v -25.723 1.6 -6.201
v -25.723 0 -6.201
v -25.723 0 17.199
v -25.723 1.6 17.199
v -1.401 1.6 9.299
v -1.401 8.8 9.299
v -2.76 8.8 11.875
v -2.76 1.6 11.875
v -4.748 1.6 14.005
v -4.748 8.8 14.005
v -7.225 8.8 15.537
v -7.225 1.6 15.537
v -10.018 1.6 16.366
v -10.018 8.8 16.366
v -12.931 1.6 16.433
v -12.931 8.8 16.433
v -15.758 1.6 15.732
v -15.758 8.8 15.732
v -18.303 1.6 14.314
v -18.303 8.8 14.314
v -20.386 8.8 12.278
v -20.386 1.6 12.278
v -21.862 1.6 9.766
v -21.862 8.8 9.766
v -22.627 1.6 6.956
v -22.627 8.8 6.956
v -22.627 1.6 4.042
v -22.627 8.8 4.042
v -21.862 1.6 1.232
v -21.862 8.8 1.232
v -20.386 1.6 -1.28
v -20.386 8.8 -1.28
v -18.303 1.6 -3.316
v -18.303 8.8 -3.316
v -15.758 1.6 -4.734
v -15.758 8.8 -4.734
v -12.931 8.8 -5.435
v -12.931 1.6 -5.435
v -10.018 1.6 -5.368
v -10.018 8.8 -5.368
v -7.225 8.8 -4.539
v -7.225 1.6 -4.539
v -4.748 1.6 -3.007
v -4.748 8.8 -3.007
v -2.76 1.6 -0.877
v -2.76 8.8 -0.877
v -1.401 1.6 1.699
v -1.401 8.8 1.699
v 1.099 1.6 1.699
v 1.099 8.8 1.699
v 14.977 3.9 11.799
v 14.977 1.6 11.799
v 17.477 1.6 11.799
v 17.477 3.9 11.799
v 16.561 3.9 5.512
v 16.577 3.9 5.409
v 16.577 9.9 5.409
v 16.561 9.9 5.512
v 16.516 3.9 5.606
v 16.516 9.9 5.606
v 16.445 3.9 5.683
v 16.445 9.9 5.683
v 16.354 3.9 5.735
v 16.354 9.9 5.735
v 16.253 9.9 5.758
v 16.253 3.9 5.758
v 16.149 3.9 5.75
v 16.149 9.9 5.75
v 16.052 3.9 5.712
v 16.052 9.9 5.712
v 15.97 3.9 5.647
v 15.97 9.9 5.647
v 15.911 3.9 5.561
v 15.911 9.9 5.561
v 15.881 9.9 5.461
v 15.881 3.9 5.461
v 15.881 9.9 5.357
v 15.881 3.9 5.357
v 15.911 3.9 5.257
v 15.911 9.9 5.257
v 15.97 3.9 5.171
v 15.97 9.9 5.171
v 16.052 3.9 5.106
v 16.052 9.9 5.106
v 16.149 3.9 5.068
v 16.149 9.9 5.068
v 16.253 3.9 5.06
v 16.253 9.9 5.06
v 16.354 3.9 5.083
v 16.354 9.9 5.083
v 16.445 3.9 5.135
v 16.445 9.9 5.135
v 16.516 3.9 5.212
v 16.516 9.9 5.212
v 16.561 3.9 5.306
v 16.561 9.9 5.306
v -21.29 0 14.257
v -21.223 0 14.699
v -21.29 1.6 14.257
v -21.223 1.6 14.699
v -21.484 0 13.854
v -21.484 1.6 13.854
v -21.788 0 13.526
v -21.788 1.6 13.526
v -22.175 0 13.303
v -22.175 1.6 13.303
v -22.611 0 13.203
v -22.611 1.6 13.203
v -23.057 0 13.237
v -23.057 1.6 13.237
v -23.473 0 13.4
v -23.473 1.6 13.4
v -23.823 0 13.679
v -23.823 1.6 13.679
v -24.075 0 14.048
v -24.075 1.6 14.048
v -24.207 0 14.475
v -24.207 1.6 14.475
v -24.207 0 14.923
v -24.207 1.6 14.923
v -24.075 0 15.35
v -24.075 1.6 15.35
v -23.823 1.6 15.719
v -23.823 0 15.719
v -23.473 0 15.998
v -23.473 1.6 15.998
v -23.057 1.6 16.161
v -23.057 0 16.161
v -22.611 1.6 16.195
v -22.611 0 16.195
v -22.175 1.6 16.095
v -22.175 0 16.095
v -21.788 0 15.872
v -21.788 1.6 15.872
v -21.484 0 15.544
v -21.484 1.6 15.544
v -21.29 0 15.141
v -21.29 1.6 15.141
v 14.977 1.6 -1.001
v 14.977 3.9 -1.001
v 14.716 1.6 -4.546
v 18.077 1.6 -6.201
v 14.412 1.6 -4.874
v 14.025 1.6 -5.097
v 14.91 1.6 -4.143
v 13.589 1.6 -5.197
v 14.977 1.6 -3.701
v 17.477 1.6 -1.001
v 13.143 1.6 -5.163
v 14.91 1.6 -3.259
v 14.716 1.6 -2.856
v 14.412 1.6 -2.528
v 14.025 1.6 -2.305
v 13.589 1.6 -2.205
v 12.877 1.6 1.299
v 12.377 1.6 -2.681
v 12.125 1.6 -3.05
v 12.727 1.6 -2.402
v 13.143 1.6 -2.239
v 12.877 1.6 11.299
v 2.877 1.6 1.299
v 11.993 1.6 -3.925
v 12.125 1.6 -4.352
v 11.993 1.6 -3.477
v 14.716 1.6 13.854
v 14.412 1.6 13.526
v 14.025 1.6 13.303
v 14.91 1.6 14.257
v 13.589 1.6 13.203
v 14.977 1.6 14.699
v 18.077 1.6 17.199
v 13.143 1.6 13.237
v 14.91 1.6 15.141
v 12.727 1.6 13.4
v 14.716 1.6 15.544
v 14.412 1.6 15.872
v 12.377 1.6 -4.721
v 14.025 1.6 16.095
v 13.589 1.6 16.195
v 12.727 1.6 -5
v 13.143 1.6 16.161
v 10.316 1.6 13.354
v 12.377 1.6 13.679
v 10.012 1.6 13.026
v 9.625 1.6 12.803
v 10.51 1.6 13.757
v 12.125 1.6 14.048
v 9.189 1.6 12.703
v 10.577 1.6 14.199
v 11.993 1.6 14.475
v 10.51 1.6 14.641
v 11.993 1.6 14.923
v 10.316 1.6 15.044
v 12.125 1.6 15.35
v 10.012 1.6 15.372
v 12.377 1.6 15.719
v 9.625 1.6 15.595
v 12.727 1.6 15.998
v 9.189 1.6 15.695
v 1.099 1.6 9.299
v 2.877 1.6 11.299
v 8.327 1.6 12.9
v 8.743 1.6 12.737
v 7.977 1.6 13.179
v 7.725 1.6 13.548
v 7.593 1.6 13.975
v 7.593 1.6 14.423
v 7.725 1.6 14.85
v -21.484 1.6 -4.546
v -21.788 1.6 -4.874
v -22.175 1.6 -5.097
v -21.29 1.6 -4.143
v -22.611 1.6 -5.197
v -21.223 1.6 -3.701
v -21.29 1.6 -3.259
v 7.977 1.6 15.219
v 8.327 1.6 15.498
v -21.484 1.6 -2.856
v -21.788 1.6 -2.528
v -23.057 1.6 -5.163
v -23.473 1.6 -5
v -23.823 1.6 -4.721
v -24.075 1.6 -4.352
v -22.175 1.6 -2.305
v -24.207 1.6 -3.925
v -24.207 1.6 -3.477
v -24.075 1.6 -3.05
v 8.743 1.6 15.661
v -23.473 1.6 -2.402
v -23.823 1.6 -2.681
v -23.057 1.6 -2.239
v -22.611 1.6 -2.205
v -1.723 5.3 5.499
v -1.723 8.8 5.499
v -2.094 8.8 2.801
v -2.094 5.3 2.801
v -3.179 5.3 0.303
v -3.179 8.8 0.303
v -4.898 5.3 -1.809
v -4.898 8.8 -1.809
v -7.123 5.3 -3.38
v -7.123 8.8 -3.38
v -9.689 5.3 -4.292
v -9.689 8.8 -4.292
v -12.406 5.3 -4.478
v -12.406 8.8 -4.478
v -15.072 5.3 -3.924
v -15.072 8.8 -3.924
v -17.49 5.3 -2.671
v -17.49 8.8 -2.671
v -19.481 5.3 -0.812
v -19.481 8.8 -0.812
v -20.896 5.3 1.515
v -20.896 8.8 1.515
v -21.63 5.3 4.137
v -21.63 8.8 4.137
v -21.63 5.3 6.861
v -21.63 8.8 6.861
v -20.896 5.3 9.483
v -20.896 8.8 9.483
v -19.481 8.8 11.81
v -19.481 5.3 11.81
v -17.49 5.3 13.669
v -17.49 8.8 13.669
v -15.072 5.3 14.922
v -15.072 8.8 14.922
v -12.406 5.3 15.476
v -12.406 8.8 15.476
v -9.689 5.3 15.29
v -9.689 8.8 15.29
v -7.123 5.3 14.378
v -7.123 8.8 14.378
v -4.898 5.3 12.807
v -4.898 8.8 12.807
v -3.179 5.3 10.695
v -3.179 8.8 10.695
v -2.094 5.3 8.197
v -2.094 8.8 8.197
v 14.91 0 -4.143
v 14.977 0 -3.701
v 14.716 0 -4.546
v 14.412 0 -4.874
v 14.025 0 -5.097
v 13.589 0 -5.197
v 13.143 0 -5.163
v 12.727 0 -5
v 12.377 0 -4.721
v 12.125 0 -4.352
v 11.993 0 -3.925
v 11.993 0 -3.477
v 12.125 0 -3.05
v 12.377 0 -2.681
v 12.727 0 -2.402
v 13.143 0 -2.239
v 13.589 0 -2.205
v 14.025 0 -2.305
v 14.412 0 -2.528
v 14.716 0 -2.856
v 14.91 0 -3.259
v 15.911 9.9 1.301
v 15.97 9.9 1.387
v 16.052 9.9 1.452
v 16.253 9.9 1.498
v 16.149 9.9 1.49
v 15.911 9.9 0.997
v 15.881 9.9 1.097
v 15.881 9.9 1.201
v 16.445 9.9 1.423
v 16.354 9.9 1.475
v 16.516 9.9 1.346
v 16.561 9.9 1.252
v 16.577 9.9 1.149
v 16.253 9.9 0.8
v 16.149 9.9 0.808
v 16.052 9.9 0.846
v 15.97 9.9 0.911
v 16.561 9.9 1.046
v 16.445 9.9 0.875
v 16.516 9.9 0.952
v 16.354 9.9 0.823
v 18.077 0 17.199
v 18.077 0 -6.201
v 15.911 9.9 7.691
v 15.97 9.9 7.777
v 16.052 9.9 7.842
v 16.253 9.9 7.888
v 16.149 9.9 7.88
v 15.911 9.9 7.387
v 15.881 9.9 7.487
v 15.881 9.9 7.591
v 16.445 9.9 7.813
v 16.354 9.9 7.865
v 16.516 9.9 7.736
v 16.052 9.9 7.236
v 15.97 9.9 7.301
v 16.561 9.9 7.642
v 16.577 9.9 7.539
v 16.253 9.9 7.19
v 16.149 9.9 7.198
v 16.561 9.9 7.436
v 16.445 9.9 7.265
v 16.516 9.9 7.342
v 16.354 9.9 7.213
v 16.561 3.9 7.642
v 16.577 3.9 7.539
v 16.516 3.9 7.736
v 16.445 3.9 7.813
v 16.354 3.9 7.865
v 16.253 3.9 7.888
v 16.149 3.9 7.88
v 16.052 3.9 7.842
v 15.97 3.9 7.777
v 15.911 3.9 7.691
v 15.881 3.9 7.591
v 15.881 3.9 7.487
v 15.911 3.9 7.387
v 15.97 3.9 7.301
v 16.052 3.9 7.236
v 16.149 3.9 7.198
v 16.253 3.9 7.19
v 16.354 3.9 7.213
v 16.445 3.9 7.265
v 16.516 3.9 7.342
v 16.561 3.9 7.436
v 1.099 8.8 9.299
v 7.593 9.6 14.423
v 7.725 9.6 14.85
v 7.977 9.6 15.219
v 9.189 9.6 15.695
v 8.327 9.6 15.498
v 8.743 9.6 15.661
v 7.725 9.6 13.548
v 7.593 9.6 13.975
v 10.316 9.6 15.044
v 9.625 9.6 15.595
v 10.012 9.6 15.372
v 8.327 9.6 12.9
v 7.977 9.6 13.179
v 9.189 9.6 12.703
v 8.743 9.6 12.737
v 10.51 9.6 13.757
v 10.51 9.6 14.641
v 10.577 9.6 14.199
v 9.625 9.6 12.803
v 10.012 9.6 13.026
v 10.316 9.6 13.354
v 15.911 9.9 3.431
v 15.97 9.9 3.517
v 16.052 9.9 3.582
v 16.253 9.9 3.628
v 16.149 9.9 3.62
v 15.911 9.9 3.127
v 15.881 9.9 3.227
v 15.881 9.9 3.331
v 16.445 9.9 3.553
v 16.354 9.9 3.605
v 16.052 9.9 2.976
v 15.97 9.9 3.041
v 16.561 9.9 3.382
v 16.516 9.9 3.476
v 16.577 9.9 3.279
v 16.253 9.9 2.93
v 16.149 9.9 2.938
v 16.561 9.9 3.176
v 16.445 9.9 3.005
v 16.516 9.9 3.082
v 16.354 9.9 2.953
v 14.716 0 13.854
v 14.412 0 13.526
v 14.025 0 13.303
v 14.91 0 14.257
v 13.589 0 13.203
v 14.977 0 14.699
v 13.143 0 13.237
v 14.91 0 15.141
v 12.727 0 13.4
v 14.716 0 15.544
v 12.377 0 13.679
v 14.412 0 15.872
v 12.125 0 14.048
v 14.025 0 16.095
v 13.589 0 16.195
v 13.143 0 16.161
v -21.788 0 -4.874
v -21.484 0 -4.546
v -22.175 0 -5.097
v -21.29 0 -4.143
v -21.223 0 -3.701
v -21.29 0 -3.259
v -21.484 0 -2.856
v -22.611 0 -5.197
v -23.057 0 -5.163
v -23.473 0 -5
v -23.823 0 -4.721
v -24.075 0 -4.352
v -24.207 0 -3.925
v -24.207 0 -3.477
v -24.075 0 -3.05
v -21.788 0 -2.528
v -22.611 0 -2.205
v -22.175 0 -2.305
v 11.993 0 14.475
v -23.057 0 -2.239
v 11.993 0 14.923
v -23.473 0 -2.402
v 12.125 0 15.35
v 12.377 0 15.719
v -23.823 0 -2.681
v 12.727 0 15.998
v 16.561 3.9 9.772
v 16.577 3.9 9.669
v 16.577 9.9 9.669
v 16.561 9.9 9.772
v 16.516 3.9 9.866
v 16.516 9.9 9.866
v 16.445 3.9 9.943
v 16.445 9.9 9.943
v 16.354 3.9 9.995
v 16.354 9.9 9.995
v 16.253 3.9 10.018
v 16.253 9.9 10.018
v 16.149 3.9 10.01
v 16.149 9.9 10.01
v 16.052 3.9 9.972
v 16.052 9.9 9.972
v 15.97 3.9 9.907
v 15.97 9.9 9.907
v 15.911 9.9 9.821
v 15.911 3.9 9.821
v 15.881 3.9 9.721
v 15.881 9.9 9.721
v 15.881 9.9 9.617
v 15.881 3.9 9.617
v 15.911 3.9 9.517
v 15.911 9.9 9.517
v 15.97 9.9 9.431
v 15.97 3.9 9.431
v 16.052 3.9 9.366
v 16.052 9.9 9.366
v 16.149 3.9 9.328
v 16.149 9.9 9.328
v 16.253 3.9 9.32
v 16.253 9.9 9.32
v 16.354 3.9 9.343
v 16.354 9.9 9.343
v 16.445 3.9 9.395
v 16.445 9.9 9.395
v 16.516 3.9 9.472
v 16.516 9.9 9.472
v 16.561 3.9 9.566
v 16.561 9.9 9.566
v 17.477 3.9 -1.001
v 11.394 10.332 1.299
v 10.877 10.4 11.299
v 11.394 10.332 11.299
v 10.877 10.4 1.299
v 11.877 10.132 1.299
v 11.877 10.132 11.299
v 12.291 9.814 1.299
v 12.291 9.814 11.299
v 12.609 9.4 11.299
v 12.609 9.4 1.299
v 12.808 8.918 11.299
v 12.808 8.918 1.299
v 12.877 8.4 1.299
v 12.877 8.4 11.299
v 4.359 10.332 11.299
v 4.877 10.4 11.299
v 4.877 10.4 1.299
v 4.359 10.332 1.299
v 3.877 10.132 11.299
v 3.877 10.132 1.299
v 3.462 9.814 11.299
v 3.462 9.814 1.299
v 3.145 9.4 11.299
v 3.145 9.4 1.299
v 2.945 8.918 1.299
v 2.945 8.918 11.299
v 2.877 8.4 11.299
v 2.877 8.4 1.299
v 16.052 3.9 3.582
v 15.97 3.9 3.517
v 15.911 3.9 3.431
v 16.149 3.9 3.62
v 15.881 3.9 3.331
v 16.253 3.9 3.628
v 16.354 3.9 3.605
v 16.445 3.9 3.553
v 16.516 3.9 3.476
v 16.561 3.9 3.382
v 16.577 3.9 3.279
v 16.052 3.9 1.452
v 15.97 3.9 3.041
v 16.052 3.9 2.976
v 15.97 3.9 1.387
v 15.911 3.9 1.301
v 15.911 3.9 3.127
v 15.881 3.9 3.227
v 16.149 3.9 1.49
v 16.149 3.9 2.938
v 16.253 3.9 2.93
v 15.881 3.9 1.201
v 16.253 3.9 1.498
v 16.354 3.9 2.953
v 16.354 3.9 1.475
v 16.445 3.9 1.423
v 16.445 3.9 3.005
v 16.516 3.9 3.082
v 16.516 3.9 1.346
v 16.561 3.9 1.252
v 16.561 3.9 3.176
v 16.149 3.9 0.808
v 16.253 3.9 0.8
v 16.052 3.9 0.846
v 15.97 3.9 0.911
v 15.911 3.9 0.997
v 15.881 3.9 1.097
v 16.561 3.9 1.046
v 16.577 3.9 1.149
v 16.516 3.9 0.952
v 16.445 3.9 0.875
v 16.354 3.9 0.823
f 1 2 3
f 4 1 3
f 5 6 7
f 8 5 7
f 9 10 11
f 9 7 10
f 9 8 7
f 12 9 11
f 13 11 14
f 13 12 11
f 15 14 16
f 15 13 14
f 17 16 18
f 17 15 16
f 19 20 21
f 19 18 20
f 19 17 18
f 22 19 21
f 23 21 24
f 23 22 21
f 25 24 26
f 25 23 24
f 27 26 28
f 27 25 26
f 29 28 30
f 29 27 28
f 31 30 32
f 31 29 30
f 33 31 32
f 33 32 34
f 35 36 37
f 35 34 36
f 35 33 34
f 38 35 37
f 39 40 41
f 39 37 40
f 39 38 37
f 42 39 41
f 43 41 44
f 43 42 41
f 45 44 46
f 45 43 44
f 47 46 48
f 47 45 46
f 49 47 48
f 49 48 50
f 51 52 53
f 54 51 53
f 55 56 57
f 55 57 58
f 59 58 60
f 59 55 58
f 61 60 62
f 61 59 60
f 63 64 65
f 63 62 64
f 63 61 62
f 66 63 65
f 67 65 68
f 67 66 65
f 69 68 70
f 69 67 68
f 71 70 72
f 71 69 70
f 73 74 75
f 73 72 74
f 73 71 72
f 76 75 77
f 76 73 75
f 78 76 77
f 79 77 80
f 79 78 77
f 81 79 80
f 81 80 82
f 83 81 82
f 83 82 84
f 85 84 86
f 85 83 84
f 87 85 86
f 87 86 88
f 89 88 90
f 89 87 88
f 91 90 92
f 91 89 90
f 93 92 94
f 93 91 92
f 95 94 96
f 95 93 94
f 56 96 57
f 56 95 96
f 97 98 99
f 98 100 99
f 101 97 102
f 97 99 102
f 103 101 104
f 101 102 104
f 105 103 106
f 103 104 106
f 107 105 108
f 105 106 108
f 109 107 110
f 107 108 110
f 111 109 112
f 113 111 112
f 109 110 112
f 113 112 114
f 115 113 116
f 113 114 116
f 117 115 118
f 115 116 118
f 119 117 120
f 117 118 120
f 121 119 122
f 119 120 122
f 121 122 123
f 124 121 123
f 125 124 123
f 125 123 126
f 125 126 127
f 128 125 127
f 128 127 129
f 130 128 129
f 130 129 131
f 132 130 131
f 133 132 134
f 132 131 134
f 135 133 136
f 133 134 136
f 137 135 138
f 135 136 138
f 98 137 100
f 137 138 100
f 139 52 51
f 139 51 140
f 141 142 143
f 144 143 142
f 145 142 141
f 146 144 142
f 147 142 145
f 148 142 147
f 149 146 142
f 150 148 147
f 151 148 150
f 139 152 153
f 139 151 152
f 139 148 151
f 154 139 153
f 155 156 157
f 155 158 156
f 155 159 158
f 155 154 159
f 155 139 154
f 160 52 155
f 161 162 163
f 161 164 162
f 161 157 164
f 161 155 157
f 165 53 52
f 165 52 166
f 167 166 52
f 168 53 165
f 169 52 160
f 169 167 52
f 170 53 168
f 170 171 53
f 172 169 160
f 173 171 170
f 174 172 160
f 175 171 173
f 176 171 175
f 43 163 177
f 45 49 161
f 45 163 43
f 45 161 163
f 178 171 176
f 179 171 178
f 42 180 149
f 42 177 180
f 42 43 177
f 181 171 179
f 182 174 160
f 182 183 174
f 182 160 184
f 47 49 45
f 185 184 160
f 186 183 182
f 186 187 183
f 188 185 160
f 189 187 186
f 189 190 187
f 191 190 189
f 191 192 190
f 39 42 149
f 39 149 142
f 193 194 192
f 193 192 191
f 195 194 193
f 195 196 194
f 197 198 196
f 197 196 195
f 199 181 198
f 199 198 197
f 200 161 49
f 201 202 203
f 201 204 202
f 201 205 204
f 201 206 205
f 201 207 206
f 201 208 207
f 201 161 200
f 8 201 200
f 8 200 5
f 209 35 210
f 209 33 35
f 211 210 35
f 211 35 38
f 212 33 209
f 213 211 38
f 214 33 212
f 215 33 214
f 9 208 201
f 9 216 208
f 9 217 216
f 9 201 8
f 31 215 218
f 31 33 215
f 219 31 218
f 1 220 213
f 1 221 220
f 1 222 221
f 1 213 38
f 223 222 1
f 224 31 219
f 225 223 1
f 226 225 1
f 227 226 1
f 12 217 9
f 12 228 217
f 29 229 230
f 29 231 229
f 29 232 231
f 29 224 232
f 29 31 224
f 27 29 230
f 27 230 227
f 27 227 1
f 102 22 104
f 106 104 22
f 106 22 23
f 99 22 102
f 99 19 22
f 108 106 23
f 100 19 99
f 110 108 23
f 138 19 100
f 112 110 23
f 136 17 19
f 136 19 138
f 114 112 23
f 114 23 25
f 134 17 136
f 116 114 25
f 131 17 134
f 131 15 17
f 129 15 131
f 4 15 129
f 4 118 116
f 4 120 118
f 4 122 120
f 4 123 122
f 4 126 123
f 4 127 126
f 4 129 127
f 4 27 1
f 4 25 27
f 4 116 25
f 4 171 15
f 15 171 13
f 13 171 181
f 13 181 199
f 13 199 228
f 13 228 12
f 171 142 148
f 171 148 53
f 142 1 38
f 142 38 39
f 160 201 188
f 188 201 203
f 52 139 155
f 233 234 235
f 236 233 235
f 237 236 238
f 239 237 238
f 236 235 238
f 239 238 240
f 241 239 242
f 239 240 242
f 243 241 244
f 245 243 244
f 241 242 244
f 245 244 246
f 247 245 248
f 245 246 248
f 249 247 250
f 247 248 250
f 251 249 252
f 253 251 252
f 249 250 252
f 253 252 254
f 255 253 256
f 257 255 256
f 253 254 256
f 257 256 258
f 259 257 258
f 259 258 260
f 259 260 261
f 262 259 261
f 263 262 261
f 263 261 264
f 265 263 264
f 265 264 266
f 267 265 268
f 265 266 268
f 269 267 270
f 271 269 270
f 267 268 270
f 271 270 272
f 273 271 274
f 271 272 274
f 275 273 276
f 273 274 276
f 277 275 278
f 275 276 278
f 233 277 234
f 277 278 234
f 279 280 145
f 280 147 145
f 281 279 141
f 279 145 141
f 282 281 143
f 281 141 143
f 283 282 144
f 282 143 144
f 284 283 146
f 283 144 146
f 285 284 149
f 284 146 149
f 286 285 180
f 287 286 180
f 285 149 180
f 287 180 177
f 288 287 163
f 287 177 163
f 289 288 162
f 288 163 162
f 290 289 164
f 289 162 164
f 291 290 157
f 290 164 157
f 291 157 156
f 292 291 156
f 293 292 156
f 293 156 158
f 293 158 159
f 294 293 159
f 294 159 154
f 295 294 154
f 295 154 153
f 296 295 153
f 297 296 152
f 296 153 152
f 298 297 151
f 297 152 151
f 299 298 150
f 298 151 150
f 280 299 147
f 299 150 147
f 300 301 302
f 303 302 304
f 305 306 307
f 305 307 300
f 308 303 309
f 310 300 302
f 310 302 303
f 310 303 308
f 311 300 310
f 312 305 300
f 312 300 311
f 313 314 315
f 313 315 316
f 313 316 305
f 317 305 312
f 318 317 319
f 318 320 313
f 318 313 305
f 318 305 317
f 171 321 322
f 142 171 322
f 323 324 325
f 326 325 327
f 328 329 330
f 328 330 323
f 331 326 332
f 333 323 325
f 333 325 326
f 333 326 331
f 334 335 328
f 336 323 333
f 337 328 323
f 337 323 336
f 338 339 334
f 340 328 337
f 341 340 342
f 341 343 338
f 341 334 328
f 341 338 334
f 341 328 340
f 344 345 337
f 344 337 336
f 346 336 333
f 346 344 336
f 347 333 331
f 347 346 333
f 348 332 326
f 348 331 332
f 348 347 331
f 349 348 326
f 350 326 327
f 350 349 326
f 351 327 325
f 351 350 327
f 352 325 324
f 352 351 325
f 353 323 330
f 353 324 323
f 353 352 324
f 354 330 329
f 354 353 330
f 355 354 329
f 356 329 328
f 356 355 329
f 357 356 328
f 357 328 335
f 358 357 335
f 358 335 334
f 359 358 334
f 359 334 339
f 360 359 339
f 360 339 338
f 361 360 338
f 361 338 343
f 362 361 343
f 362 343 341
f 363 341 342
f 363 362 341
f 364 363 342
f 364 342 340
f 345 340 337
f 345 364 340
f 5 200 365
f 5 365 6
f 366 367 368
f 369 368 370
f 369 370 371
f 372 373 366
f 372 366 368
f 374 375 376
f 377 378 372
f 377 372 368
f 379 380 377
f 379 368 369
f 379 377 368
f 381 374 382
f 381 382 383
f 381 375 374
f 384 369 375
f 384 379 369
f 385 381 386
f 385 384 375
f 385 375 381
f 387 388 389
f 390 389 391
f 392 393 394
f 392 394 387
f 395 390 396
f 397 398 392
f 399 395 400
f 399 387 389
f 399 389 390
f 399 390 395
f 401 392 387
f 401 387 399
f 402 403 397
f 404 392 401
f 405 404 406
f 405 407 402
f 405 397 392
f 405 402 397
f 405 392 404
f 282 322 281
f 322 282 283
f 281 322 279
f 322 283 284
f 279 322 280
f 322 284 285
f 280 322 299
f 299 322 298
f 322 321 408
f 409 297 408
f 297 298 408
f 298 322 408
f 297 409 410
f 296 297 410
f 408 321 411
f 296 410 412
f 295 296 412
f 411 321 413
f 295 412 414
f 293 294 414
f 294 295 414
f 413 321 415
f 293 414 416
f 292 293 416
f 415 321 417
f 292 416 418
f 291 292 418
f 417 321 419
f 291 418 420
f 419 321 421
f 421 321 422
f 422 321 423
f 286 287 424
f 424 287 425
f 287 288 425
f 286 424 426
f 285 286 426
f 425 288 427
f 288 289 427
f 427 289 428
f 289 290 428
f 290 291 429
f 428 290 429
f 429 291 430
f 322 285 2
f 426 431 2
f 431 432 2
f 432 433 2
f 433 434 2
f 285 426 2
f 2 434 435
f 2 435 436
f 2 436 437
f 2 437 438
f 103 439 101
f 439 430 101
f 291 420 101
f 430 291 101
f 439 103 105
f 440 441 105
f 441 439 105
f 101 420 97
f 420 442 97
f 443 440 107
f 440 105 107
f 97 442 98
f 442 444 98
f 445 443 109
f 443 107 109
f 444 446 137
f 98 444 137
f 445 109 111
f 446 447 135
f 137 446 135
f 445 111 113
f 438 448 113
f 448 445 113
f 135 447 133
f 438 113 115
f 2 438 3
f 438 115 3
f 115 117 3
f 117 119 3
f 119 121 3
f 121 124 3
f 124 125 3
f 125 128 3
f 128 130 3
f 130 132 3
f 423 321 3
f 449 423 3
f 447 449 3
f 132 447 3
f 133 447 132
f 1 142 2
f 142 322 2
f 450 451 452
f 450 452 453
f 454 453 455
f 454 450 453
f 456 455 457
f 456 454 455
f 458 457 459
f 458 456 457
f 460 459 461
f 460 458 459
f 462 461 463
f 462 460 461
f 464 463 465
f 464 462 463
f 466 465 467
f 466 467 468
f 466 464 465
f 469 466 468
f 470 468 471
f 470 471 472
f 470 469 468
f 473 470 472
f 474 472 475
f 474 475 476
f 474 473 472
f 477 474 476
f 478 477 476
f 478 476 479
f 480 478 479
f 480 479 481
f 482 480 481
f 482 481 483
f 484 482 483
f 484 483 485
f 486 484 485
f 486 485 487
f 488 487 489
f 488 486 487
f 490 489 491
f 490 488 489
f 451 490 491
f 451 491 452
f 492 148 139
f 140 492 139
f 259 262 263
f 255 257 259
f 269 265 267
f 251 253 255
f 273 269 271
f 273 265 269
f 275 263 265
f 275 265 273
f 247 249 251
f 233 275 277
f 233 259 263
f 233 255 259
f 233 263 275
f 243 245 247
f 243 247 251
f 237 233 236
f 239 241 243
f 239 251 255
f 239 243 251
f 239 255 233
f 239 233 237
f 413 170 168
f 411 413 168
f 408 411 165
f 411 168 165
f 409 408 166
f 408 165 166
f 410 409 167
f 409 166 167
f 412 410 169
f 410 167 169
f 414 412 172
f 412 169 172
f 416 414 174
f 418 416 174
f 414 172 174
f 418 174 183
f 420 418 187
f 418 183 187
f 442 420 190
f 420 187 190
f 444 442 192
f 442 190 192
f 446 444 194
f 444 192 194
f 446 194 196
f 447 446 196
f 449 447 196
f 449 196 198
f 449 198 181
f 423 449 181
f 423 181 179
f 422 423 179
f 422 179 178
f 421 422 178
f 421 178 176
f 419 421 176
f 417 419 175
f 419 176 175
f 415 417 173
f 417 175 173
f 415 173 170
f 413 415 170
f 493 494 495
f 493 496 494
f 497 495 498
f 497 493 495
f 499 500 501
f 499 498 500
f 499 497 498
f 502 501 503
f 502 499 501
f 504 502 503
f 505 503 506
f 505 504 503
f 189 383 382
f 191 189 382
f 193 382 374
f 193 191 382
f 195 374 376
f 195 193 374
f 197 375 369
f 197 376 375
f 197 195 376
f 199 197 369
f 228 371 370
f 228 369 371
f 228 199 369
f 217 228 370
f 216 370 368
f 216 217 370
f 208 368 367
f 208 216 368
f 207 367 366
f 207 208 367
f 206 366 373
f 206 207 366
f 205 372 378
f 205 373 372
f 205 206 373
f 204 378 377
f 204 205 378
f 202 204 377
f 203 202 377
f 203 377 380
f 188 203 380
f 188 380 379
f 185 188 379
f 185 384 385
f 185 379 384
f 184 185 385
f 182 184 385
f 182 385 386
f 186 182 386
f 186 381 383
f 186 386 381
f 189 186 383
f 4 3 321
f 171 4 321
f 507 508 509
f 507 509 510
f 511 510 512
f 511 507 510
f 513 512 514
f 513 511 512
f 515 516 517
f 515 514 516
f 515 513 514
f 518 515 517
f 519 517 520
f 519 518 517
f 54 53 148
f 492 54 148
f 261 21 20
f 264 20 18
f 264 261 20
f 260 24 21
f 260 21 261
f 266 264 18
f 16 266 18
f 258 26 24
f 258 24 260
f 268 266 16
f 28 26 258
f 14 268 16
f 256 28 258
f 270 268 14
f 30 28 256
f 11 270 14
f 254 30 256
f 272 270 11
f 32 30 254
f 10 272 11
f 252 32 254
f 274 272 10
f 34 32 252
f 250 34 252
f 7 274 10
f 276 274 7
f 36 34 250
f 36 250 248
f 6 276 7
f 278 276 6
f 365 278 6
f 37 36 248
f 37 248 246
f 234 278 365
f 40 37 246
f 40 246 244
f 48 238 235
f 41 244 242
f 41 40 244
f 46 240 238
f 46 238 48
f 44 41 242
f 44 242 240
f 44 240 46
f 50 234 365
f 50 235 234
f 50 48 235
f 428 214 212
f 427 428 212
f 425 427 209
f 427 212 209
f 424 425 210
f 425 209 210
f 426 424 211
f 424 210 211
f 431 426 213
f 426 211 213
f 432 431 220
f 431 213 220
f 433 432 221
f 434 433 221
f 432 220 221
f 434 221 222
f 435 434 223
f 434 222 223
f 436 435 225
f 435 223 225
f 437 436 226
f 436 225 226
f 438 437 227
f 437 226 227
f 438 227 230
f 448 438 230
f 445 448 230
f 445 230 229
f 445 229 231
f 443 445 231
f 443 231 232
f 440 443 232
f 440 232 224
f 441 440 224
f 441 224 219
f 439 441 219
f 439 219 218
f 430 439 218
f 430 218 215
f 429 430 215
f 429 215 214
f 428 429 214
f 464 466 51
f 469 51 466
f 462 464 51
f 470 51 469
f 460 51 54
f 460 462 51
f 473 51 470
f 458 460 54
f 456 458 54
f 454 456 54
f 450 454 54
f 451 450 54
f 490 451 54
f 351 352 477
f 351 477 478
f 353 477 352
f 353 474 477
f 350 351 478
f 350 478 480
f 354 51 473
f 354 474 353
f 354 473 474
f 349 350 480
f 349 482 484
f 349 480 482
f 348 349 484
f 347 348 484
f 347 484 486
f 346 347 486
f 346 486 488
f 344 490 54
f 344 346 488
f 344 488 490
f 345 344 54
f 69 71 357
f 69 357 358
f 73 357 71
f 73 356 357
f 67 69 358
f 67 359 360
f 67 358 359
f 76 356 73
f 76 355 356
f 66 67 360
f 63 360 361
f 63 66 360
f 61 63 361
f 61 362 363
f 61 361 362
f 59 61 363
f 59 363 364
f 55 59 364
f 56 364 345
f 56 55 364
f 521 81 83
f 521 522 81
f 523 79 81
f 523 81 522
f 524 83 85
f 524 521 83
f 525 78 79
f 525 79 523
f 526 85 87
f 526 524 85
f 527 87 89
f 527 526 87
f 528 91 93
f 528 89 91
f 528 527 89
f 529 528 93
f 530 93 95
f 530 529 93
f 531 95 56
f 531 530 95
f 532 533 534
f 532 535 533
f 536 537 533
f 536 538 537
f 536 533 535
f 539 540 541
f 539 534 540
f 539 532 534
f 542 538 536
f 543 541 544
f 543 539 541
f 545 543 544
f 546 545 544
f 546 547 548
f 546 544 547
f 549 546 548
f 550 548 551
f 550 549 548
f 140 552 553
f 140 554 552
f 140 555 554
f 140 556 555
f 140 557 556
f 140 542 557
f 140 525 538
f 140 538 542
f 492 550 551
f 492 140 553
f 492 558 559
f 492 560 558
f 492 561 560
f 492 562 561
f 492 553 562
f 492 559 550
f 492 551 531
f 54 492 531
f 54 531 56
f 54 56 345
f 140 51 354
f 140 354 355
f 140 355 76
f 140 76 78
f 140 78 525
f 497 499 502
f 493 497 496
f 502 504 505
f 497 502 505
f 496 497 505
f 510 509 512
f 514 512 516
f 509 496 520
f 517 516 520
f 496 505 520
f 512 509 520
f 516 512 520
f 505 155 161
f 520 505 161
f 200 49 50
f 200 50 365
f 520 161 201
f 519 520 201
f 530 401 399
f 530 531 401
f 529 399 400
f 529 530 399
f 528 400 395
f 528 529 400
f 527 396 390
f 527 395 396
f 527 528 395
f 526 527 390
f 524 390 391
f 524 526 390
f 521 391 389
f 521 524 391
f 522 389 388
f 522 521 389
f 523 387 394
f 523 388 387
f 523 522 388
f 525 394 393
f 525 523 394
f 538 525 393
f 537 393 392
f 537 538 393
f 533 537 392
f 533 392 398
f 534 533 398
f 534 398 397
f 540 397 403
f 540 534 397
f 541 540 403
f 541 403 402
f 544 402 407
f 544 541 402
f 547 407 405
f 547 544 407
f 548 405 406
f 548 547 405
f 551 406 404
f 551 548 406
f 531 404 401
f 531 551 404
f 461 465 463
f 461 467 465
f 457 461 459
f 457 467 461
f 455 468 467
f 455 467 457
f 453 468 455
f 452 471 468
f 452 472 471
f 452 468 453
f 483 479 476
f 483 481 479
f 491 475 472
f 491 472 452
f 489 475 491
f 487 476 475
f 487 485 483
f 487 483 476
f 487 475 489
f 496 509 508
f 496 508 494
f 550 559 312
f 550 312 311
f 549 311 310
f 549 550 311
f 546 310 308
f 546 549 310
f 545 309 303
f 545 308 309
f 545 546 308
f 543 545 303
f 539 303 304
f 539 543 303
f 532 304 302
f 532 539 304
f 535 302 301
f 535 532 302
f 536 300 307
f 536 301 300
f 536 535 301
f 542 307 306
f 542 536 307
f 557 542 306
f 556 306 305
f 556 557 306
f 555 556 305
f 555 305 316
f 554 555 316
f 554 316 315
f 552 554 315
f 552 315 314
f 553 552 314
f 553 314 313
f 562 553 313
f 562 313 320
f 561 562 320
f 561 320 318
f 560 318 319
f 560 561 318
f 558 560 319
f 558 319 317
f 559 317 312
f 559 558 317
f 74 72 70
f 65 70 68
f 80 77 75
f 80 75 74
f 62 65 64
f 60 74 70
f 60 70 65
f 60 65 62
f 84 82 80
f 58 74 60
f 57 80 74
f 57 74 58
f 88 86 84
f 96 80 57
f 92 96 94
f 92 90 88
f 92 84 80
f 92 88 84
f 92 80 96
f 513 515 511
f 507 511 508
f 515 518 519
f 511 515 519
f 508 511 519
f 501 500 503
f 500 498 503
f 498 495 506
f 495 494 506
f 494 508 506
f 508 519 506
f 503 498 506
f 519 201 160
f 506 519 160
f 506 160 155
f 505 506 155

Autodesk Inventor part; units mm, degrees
ref_plane "YZ Plane" through (0, 0, 0) normal (1, 0, 0) x (0, 1, 0)
ref_plane "XZ Plane" through (0, 0, 0) normal (0, 1, 0) x (-1, 0, 0)
ref_plane "XY Plane" through (0, 0, 0) normal (0, 0, 1) x (1, 0, 0)
sketch "Sketch1" plane through (0, 0, 0) normal (0, 1, 0) x (-1, 0, 0)
  line L0 (25.7234, 17.199) -> (-18.0766, 17.199)
  line L1 (-18.0766, 17.199) -> (-18.0766, -6.201)
  line L2 (-18.0766, -6.201) -> (25.7234, -6.201)
  line L3 (25.7234, -6.201) -> (25.7234, 17.199)
  point P0 (0, 0)
  dimension "d0" = 43.8
  dimension "d1" = 23.4
extrude "Extrusion1" add sketch "Sketch1" along normal blind 1.6
sketch "Sketch2" plane through (0, 1.6, 0) normal (0, 1, 0) x (1, 0, 0)
  line L0 (18.0766, -17.199) -> (18.0766, 6.201) projected
  line L1 (14.9766, -11.799) -> (14.9766, 1.001)
  line L2 (-25.7234, -17.199) -> (18.0766, -17.199) projected
  line L3 (14.9766, -11.799) -> (17.4766, -11.799)
  line L4 (17.4766, -11.799) -> (17.4766, 1.001)
  line L5 (17.4766, 1.001) -> (14.9766, 1.001)
  point P0 (0, 0)
  dimension "d6" = 12.8
  dimension "d7" = 0.6
  dimension "d8" = 2.5
  dimension "d9" = 5.4
extrude "Extrusion2" add sketch "Sketch2" along normal blind 2.3
sketch "Sketch3" plane through (0, 3.9, 0) normal (0, 1, 0) x (1, 0, 0)
  line L0 (14.9766, -11.799) -> (17.4766, -11.799) projected
  line L1 (16.2266, -11.799) -> (16.2266, -9.669)
  circle A0 centre (16.2266, -9.669) radius 0.35
  circle A1 centre (16.2266, -7.539) radius 0.35
  circle A2 centre (16.2266, -5.409) radius 0.35
  circle A3 centre (16.2266, -3.279) radius 0.35
  circle A4 centre (16.2266, -1.149) radius 0.35
  point P0 (0, 0)
  dimension "d12" = 2.13
  dimension "d13" = 0.7
  dimension "d14" = 0.7
  dimension "d15" = 0.7
  dimension "d16" = 0.7
  dimension "d17" = 0.7
  dimension "d19" = 2.13
  dimension "d20" = 2.13
  dimension "d21" = 2.13
  dimension "d22" = 2.13
extrude "Extrusion3" add sketch "Sketch3" along normal blind 6
sketch "Sketch4" plane through (0, 1.6, 0) normal (0, 1, 0) x (1, 0, 0)
  circle A0 centre (-11.7234, -5.499) radius 11
  line L0 (-25.7234, -17.199) -> (18.0766, -17.199) projected
  line L1 (18.0766, 6.201) -> (-25.7234, 6.201) projected
  line L2 (-25.7234, 6.201) -> (-25.7234, -17.199) projected
  point P0 (0, 0)
  dimension "d25" = 22
  dimension "d44" = 14
  dimension "d45" = 11.7
extrude "Extrusion4" add sketch "Sketch4" along normal blind 7.2
sketch "Sketch5" plane through (0, 1.6, 0) normal (0, 1, 0) x (1, 0, 0)
  circle A0 centre (-11.7234, -5.499) radius 11 projected
  line L0 (-1.4006, -1.699) -> (1.0994, -1.699)
  line L1 (1.0994, -1.699) -> (1.0994, -9.299)
  line L2 (1.0994, -9.299) -> (-1.4006, -9.299)
  point P0 (0, 0)
  dimension "d30" = 7.6
  dimension "d31" = 2.5
  dimension "d32" = 2.5
extrude "Extrusion5" add sketch "Sketch5" along normal blind 7.2 contours A0 L0 L1 L2
sketch "Sketch6" plane through (0, 8.8, 0) normal (0, 1, 0) x (1, 0, 0)
  arc A0 (-1.4006, -1.699) -> (-1.4006, -9.299) centre (-11.7234, -5.499) ccw projected
  circle A1 centre (-11.7234, -5.499) radius 10
  point P0 (0, 0)
  dimension "d35" = 20
extrude "Extrusion6" cut sketch "Sketch6" against normal blind 3.5
sketch "Sketch7" plane through (0, 1.6, 0) normal (0, 1, 0) x (1, 0, 0)
  point P0 (0, 0)
sketch "Sketch8" plane through (0, 1.6, 0) normal (0, 1, 0) x (1, 0, 0)
  line L0 (12.8766, -11.299) -> (12.8766, -1.299)
  line L1 (12.8766, -1.299) -> (2.8766, -1.299)
  line L2 (2.8766, -1.299) -> (2.8766, -11.299)
  line L3 (2.8766, -11.299) -> (12.8766, -11.299)
  line L4 (14.9766, 1.001) -> (14.9766, -11.799) projected
  line L5 (18.0766, 6.201) -> (-25.7234, 6.201) projected
  point P0 (0, 0)
  dimension "d38" = 2.1
  dimension "d39" = 10
  dimension "d40" = 10
  dimension "d41" = 7.5
extrude "Extrusion7" add sketch "Sketch8" along normal blind 8.8
sketch "Sketch10" plane through (0, 1.6, 0) normal (0, 1, 0) x (1, 0, 0)
  circle A0 centre (9.0766, -14.199) radius 1.5
  line L0 (18.0766, -17.199) -> (18.0766, 6.201) projected
  line L1 (-25.7234, -17.199) -> (18.0766, -17.199) projected
  point P0 (0, 0)
  dimension "d46" = 3
  dimension "d47" = 9
  dimension "d48" = 3
extrude "Extrusion8" add sketch "Sketch10" along normal blind 8
fillet "Fillet1" radius 2 2 edges at (12.8766, 10.4, 6.299) (2.8766, 10.4, 6.299)
sketch "Sketch11" plane through (0, 1.6, 0) normal (0, 1, 0) x (1, 0, 0)
  circle A0 centre (13.4766, -14.699) radius 1.5
  circle A1 centre (13.4766, 3.701) radius 1.5
  circle A2 centre (-22.7234, 3.701) radius 1.5
  circle A3 centre (-22.7234, -14.699) radius 1.5
  line L0 (-25.7234, 6.201) -> (-25.7234, -17.199) projected
  line L1 (-25.7234, -17.199) -> (18.0766, -17.199) projected
  point P0 (0, 0)
  dimension "d52" = 3
  dimension "d53" = 3
  dimension "d54" = 21.4
  dimension "d55" = 3
  dimension "d56" = 36.2
  dimension "d57" = 3
  dimension "d58" = 3
  dimension "d59" = 3
  dimension "d60" = 18.4
  dimension "d61" = 2.5
  dimension "d62" = 2.5
  dimension "d64" = 36.2
extrude "Extrusion9" cut sketch "Sketch11" against normal blind 8
sketch "Sketch12" plane through (0, 1.6, 0) normal (0, 1, 0) x (1, 0, 0)
  circle A0 centre (-22.7234, -14.699) radius 1.5 projected
  circle A1 centre (-22.7234, -14.699) radius 1.5
  circle A2 centre (-22.7234, 3.701) radius 1.5 projected
  circle A3 centre (-22.7234, 3.701) radius 1.5
  circle A4 centre (13.4766, 3.701) radius 1.5 projected
  circle A5 centre (13.4766, 3.701) radius 1.5
  circle A6 centre (13.4766, -14.699) radius 1.5 projected
  circle A7 centre (13.4766, -14.699) radius 1.5
  point P0 (0, 0)
properties part number "DS1302"
